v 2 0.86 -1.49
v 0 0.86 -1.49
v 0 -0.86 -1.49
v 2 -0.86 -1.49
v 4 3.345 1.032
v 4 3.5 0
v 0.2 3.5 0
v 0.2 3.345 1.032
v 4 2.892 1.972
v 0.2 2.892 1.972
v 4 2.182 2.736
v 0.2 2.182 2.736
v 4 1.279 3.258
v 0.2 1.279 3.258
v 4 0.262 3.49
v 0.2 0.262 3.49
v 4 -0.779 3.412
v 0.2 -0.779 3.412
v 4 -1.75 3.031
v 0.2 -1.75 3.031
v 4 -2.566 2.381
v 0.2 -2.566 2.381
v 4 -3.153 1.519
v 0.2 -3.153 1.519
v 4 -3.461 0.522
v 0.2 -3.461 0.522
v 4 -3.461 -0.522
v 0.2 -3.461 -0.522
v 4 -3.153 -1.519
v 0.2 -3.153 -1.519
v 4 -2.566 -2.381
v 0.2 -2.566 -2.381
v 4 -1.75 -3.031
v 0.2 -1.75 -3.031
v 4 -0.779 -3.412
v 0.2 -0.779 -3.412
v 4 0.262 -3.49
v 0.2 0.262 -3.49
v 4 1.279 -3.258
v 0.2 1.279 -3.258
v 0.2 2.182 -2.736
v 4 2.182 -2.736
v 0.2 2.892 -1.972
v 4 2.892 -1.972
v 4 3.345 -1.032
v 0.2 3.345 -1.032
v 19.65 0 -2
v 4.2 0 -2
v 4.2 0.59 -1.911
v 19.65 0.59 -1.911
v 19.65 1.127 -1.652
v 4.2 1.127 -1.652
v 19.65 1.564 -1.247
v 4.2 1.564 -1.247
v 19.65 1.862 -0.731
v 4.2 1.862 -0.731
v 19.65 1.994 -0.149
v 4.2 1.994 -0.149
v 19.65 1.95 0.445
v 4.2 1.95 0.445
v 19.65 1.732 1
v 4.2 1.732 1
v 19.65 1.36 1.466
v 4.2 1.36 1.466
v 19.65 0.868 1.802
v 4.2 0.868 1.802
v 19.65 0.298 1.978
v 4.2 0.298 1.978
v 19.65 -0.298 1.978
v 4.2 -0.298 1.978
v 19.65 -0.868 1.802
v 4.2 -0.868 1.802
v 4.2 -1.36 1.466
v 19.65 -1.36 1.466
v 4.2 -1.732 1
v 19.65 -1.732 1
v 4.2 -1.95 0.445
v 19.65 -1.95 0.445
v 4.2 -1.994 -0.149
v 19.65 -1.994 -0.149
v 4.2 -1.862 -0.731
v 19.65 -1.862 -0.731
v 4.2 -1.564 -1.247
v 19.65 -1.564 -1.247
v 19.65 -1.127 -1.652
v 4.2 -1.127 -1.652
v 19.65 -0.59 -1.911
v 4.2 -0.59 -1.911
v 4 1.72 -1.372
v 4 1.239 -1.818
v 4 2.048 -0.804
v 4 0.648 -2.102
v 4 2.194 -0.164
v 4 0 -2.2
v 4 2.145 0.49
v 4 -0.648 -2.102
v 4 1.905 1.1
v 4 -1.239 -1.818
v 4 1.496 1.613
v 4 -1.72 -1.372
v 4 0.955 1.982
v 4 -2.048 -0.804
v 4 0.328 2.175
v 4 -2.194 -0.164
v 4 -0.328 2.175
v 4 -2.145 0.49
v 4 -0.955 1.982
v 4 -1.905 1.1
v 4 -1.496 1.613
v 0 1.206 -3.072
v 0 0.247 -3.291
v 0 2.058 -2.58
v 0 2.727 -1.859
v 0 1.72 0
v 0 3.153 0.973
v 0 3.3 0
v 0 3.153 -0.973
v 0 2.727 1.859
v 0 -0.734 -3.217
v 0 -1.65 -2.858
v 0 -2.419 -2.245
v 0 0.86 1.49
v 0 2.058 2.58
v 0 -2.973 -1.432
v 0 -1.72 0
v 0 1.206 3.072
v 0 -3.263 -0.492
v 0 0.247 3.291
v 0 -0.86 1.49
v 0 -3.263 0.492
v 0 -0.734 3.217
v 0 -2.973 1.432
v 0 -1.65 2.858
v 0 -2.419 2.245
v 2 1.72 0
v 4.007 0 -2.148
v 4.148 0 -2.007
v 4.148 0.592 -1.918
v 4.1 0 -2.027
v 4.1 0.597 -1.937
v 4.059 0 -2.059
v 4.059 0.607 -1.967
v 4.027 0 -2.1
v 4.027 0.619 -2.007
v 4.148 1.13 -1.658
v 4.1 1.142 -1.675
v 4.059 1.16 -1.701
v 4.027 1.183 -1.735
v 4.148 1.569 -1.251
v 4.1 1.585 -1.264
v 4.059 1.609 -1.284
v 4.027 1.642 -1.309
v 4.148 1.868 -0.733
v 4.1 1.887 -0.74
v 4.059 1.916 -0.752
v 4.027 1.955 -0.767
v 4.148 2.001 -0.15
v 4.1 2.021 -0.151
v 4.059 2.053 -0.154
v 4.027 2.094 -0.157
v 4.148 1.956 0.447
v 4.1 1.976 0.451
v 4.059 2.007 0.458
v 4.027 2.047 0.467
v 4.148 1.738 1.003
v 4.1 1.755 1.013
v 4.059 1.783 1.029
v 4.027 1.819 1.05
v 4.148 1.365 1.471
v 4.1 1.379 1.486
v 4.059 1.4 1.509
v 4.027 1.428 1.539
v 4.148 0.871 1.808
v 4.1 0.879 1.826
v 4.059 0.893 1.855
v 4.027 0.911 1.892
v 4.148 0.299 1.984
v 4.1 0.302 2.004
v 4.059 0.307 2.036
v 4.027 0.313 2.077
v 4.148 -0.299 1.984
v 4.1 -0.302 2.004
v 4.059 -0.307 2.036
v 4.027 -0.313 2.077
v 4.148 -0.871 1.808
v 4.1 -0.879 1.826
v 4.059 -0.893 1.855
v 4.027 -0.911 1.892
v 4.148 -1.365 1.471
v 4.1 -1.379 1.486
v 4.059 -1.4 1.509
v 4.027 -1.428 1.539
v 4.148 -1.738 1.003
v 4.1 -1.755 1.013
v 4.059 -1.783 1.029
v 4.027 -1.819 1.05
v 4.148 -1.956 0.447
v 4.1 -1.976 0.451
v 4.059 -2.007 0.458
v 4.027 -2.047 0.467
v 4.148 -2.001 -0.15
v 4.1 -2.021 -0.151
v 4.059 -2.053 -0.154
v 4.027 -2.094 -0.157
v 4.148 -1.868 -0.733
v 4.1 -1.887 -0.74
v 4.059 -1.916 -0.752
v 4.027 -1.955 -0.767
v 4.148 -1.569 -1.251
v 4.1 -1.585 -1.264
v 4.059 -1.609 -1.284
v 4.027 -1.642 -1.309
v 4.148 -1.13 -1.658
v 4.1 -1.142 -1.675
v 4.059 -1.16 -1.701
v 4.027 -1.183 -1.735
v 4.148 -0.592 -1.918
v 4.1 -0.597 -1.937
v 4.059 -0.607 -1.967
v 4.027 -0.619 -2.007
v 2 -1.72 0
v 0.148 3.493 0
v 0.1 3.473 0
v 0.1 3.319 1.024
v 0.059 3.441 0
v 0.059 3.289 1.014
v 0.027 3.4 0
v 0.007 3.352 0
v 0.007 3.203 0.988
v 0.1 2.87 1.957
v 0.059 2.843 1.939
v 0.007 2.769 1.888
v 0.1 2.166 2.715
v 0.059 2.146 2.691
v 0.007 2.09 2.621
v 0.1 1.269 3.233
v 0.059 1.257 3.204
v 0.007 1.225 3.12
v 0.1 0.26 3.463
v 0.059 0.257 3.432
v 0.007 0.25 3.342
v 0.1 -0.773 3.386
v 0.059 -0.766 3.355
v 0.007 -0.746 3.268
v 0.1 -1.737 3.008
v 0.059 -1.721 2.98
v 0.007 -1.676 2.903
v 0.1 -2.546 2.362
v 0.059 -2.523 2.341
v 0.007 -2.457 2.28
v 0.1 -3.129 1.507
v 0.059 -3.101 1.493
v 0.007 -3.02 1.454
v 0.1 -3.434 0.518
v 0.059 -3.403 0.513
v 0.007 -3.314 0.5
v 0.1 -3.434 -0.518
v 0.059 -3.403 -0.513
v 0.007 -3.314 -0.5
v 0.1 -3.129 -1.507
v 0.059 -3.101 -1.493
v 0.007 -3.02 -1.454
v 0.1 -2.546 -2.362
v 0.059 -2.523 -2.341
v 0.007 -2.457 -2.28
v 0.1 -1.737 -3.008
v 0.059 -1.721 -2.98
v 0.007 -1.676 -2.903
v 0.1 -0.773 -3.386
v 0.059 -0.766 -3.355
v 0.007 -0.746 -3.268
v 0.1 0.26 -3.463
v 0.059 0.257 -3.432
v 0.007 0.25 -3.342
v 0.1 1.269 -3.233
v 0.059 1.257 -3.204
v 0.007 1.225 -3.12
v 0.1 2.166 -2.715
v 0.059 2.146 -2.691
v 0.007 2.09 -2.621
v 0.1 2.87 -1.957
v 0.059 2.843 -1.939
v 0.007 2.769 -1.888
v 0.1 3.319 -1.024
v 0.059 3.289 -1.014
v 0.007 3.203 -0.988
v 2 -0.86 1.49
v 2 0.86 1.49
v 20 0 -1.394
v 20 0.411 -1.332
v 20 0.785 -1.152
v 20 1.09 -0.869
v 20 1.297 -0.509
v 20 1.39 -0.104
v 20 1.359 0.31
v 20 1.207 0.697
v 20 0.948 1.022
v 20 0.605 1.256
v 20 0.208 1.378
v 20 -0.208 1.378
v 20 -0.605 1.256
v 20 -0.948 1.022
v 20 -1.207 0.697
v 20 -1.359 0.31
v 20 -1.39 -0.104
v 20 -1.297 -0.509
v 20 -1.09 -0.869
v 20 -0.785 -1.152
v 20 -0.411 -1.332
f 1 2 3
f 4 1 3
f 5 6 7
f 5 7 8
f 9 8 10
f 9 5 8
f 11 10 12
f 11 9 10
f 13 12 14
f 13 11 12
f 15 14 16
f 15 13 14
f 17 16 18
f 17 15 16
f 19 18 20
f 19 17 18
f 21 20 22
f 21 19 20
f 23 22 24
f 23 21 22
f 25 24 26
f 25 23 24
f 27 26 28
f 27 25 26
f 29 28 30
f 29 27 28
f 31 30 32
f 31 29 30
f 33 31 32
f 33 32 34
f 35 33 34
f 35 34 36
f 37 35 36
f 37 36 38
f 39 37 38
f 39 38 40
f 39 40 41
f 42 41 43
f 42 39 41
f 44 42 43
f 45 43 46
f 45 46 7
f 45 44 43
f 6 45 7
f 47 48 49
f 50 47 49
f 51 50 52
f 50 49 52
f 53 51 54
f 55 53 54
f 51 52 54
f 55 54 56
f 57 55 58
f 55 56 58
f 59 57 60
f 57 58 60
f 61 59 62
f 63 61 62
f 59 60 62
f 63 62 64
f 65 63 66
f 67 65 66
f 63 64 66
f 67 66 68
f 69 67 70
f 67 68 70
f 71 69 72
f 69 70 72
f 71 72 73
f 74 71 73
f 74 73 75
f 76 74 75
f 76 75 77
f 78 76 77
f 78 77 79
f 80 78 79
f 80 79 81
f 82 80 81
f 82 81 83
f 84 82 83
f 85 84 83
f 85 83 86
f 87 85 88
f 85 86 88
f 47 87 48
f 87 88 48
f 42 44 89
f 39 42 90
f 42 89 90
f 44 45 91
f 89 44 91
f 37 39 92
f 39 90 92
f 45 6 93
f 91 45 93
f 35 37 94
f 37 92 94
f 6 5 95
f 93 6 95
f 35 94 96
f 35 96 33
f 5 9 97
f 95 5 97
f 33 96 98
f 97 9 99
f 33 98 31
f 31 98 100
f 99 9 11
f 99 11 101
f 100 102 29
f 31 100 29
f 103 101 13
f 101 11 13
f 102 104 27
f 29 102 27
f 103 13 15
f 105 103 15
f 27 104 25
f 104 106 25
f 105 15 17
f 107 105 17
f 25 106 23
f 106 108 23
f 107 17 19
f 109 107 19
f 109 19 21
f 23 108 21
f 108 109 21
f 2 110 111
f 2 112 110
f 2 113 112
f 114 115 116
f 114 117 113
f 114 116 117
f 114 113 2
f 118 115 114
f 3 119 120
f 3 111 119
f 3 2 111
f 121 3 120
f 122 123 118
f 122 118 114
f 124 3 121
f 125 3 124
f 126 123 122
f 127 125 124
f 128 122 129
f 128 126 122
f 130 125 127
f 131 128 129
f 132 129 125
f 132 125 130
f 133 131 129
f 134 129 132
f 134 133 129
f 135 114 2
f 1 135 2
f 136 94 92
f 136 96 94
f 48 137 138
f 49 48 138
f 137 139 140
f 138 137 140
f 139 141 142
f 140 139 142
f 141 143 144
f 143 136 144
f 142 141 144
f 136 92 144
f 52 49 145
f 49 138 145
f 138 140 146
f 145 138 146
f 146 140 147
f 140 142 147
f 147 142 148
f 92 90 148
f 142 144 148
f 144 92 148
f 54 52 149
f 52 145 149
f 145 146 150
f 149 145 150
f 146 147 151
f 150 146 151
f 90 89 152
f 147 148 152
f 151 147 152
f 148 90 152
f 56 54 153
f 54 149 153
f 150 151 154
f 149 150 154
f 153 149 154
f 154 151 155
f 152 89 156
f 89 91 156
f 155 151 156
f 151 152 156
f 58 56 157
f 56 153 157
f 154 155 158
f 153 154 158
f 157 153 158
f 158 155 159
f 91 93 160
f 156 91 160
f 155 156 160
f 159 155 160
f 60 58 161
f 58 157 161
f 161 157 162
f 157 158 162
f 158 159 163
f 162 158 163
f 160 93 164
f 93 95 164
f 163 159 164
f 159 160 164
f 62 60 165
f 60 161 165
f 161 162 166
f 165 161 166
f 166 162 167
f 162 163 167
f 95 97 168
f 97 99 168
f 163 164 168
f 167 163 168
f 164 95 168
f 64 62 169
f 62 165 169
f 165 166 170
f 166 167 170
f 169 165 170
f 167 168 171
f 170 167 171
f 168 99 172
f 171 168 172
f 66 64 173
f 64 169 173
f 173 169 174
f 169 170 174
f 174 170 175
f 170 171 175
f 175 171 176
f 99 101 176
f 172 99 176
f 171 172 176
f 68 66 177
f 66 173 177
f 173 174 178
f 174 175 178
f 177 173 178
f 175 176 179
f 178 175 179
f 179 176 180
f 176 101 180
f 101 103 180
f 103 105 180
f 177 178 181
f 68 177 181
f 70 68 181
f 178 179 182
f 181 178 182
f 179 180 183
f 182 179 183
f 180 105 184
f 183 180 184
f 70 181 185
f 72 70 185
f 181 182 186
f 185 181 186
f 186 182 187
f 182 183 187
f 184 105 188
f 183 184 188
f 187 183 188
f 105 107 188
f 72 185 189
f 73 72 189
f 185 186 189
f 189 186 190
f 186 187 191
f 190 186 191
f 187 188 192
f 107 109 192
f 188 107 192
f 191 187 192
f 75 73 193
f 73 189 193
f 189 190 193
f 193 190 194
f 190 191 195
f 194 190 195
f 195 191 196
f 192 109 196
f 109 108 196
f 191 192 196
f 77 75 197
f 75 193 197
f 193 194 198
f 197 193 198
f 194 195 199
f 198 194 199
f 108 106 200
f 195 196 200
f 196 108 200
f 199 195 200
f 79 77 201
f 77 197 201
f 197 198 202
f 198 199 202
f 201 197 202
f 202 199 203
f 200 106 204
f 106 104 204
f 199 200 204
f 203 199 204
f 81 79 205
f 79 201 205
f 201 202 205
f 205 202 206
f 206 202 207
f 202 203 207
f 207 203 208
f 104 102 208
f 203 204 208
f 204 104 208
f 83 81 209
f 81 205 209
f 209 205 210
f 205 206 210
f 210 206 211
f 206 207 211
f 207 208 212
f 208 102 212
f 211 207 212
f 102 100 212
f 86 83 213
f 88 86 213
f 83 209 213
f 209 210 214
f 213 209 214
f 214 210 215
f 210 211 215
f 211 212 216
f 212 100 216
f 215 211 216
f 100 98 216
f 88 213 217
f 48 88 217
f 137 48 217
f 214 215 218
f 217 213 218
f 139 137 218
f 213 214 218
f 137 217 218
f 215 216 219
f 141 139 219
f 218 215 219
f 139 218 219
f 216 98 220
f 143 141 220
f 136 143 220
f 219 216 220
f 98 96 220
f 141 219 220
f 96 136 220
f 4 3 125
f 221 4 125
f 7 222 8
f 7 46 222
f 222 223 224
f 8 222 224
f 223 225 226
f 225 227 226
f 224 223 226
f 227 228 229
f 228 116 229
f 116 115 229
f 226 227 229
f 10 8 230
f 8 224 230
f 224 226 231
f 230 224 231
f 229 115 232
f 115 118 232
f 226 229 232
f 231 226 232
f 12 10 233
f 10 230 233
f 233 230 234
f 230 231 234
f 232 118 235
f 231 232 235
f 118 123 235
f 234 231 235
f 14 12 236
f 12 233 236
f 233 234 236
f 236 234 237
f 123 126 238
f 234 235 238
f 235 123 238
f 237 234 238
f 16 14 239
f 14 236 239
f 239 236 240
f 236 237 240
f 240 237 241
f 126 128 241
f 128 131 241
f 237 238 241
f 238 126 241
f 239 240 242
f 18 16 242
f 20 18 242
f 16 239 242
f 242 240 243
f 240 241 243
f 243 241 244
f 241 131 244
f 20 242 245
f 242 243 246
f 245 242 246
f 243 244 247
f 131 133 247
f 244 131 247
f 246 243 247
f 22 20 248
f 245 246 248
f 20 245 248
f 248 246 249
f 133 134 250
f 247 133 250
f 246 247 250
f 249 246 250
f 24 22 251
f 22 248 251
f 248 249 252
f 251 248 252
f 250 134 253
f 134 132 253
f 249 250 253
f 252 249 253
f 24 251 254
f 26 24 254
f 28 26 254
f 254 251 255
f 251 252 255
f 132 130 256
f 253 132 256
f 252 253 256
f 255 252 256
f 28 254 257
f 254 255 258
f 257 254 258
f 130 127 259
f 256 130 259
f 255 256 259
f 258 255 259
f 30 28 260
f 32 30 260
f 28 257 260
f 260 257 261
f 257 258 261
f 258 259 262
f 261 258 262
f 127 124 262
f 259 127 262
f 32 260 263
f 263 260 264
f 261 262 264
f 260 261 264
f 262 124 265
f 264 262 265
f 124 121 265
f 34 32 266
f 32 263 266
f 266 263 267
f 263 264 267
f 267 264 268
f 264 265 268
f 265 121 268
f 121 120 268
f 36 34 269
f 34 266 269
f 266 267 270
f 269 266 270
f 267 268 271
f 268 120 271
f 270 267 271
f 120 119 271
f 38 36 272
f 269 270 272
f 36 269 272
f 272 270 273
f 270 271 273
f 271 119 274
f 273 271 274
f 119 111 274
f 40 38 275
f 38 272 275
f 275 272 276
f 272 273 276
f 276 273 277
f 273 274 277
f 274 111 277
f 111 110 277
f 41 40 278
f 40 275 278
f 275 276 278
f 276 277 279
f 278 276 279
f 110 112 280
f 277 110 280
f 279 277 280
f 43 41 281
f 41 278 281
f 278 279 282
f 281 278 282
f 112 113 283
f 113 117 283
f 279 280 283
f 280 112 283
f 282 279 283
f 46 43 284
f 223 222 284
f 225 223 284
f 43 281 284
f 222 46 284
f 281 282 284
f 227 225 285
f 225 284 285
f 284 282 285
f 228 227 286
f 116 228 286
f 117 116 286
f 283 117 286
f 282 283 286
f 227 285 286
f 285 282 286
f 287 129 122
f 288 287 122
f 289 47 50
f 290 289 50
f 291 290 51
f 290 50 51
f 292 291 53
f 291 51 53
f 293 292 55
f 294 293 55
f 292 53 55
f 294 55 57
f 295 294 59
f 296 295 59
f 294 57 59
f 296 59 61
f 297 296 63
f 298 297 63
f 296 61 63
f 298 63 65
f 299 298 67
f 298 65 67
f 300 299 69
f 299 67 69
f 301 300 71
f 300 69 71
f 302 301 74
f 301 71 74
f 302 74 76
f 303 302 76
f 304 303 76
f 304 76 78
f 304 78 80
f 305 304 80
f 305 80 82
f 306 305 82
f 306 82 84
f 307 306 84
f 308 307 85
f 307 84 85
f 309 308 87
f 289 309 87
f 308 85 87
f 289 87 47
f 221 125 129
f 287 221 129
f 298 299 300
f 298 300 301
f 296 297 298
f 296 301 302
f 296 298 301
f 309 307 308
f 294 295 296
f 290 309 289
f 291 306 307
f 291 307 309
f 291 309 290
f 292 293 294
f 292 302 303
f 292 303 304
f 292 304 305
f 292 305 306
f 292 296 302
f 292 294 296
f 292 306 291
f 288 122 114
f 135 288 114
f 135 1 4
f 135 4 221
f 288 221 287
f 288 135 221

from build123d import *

# Parameters (mm, degrees)
SKETCH_1_W          = 4
SKETCH_1_H          = 3.5
SKETCH_2_R          = 2
EXTRUDE_1_DEPTH     = 16
CUT_EXTRUDE_1_DEPTH = 2
CHAMFER_1_SIZE      = 0.6062
CHAMFER_1_SIZE2     = 0.35
FILLET_1_R          = 0.2


with BuildPart() as part:
    # 草图1 → 旋转1 (revolve)
    with BuildSketch(Plane.XY):
        with Locations((2, 1.75)):
            Rectangle(SKETCH_1_W, SKETCH_1_H)
    revolve(axis=Axis((0, 0, 0), (1, 0, 0)))

    # 草图2 → 凸台-拉伸1 (add)
    with BuildSketch(Plane(origin=(4, 0, 0), x_dir=(0, 0, -1), z_dir=(1, 0, 0))):
        Circle(SKETCH_2_R)
    extrude(amount=EXTRUDE_1_DEPTH)

    # 草图3 → 切除-拉伸1 (cut)
    with BuildSketch(Plane.ZY):
        Polygon((0, 1.72), (-1.489563695, 0.86), (-1.489563695, -0.86), (0, -1.72), (1.489563695, -0.86), (1.489563695, 0.86), align=None)
    extrude(amount=-CUT_EXTRUDE_1_DEPTH, mode=Mode.SUBTRACT)

    # 倒角1
    chamfer_1_edges = [part.edges().sort_by_distance(p)[0] for p in [
        (20, 0, 2),
    ]]
    chamfer_1_side = [part.faces().sort_by_distance(p)[0] for p in [
        (20, 0, 0),
    ]]
    chamfer(chamfer_1_edges, length=CHAMFER_1_SIZE, length2=CHAMFER_1_SIZE2, reference=chamfer_1_side[0])

    # 圆角1
    fillet_1_edges = [part.edges().sort_by_distance(p)[0] for p in [
        (0, -3.5, 0),
        (4, 0, 2),
    ]]
    fillet(fillet_1_edges, radius=FILLET_1_R)


solid = part.part
